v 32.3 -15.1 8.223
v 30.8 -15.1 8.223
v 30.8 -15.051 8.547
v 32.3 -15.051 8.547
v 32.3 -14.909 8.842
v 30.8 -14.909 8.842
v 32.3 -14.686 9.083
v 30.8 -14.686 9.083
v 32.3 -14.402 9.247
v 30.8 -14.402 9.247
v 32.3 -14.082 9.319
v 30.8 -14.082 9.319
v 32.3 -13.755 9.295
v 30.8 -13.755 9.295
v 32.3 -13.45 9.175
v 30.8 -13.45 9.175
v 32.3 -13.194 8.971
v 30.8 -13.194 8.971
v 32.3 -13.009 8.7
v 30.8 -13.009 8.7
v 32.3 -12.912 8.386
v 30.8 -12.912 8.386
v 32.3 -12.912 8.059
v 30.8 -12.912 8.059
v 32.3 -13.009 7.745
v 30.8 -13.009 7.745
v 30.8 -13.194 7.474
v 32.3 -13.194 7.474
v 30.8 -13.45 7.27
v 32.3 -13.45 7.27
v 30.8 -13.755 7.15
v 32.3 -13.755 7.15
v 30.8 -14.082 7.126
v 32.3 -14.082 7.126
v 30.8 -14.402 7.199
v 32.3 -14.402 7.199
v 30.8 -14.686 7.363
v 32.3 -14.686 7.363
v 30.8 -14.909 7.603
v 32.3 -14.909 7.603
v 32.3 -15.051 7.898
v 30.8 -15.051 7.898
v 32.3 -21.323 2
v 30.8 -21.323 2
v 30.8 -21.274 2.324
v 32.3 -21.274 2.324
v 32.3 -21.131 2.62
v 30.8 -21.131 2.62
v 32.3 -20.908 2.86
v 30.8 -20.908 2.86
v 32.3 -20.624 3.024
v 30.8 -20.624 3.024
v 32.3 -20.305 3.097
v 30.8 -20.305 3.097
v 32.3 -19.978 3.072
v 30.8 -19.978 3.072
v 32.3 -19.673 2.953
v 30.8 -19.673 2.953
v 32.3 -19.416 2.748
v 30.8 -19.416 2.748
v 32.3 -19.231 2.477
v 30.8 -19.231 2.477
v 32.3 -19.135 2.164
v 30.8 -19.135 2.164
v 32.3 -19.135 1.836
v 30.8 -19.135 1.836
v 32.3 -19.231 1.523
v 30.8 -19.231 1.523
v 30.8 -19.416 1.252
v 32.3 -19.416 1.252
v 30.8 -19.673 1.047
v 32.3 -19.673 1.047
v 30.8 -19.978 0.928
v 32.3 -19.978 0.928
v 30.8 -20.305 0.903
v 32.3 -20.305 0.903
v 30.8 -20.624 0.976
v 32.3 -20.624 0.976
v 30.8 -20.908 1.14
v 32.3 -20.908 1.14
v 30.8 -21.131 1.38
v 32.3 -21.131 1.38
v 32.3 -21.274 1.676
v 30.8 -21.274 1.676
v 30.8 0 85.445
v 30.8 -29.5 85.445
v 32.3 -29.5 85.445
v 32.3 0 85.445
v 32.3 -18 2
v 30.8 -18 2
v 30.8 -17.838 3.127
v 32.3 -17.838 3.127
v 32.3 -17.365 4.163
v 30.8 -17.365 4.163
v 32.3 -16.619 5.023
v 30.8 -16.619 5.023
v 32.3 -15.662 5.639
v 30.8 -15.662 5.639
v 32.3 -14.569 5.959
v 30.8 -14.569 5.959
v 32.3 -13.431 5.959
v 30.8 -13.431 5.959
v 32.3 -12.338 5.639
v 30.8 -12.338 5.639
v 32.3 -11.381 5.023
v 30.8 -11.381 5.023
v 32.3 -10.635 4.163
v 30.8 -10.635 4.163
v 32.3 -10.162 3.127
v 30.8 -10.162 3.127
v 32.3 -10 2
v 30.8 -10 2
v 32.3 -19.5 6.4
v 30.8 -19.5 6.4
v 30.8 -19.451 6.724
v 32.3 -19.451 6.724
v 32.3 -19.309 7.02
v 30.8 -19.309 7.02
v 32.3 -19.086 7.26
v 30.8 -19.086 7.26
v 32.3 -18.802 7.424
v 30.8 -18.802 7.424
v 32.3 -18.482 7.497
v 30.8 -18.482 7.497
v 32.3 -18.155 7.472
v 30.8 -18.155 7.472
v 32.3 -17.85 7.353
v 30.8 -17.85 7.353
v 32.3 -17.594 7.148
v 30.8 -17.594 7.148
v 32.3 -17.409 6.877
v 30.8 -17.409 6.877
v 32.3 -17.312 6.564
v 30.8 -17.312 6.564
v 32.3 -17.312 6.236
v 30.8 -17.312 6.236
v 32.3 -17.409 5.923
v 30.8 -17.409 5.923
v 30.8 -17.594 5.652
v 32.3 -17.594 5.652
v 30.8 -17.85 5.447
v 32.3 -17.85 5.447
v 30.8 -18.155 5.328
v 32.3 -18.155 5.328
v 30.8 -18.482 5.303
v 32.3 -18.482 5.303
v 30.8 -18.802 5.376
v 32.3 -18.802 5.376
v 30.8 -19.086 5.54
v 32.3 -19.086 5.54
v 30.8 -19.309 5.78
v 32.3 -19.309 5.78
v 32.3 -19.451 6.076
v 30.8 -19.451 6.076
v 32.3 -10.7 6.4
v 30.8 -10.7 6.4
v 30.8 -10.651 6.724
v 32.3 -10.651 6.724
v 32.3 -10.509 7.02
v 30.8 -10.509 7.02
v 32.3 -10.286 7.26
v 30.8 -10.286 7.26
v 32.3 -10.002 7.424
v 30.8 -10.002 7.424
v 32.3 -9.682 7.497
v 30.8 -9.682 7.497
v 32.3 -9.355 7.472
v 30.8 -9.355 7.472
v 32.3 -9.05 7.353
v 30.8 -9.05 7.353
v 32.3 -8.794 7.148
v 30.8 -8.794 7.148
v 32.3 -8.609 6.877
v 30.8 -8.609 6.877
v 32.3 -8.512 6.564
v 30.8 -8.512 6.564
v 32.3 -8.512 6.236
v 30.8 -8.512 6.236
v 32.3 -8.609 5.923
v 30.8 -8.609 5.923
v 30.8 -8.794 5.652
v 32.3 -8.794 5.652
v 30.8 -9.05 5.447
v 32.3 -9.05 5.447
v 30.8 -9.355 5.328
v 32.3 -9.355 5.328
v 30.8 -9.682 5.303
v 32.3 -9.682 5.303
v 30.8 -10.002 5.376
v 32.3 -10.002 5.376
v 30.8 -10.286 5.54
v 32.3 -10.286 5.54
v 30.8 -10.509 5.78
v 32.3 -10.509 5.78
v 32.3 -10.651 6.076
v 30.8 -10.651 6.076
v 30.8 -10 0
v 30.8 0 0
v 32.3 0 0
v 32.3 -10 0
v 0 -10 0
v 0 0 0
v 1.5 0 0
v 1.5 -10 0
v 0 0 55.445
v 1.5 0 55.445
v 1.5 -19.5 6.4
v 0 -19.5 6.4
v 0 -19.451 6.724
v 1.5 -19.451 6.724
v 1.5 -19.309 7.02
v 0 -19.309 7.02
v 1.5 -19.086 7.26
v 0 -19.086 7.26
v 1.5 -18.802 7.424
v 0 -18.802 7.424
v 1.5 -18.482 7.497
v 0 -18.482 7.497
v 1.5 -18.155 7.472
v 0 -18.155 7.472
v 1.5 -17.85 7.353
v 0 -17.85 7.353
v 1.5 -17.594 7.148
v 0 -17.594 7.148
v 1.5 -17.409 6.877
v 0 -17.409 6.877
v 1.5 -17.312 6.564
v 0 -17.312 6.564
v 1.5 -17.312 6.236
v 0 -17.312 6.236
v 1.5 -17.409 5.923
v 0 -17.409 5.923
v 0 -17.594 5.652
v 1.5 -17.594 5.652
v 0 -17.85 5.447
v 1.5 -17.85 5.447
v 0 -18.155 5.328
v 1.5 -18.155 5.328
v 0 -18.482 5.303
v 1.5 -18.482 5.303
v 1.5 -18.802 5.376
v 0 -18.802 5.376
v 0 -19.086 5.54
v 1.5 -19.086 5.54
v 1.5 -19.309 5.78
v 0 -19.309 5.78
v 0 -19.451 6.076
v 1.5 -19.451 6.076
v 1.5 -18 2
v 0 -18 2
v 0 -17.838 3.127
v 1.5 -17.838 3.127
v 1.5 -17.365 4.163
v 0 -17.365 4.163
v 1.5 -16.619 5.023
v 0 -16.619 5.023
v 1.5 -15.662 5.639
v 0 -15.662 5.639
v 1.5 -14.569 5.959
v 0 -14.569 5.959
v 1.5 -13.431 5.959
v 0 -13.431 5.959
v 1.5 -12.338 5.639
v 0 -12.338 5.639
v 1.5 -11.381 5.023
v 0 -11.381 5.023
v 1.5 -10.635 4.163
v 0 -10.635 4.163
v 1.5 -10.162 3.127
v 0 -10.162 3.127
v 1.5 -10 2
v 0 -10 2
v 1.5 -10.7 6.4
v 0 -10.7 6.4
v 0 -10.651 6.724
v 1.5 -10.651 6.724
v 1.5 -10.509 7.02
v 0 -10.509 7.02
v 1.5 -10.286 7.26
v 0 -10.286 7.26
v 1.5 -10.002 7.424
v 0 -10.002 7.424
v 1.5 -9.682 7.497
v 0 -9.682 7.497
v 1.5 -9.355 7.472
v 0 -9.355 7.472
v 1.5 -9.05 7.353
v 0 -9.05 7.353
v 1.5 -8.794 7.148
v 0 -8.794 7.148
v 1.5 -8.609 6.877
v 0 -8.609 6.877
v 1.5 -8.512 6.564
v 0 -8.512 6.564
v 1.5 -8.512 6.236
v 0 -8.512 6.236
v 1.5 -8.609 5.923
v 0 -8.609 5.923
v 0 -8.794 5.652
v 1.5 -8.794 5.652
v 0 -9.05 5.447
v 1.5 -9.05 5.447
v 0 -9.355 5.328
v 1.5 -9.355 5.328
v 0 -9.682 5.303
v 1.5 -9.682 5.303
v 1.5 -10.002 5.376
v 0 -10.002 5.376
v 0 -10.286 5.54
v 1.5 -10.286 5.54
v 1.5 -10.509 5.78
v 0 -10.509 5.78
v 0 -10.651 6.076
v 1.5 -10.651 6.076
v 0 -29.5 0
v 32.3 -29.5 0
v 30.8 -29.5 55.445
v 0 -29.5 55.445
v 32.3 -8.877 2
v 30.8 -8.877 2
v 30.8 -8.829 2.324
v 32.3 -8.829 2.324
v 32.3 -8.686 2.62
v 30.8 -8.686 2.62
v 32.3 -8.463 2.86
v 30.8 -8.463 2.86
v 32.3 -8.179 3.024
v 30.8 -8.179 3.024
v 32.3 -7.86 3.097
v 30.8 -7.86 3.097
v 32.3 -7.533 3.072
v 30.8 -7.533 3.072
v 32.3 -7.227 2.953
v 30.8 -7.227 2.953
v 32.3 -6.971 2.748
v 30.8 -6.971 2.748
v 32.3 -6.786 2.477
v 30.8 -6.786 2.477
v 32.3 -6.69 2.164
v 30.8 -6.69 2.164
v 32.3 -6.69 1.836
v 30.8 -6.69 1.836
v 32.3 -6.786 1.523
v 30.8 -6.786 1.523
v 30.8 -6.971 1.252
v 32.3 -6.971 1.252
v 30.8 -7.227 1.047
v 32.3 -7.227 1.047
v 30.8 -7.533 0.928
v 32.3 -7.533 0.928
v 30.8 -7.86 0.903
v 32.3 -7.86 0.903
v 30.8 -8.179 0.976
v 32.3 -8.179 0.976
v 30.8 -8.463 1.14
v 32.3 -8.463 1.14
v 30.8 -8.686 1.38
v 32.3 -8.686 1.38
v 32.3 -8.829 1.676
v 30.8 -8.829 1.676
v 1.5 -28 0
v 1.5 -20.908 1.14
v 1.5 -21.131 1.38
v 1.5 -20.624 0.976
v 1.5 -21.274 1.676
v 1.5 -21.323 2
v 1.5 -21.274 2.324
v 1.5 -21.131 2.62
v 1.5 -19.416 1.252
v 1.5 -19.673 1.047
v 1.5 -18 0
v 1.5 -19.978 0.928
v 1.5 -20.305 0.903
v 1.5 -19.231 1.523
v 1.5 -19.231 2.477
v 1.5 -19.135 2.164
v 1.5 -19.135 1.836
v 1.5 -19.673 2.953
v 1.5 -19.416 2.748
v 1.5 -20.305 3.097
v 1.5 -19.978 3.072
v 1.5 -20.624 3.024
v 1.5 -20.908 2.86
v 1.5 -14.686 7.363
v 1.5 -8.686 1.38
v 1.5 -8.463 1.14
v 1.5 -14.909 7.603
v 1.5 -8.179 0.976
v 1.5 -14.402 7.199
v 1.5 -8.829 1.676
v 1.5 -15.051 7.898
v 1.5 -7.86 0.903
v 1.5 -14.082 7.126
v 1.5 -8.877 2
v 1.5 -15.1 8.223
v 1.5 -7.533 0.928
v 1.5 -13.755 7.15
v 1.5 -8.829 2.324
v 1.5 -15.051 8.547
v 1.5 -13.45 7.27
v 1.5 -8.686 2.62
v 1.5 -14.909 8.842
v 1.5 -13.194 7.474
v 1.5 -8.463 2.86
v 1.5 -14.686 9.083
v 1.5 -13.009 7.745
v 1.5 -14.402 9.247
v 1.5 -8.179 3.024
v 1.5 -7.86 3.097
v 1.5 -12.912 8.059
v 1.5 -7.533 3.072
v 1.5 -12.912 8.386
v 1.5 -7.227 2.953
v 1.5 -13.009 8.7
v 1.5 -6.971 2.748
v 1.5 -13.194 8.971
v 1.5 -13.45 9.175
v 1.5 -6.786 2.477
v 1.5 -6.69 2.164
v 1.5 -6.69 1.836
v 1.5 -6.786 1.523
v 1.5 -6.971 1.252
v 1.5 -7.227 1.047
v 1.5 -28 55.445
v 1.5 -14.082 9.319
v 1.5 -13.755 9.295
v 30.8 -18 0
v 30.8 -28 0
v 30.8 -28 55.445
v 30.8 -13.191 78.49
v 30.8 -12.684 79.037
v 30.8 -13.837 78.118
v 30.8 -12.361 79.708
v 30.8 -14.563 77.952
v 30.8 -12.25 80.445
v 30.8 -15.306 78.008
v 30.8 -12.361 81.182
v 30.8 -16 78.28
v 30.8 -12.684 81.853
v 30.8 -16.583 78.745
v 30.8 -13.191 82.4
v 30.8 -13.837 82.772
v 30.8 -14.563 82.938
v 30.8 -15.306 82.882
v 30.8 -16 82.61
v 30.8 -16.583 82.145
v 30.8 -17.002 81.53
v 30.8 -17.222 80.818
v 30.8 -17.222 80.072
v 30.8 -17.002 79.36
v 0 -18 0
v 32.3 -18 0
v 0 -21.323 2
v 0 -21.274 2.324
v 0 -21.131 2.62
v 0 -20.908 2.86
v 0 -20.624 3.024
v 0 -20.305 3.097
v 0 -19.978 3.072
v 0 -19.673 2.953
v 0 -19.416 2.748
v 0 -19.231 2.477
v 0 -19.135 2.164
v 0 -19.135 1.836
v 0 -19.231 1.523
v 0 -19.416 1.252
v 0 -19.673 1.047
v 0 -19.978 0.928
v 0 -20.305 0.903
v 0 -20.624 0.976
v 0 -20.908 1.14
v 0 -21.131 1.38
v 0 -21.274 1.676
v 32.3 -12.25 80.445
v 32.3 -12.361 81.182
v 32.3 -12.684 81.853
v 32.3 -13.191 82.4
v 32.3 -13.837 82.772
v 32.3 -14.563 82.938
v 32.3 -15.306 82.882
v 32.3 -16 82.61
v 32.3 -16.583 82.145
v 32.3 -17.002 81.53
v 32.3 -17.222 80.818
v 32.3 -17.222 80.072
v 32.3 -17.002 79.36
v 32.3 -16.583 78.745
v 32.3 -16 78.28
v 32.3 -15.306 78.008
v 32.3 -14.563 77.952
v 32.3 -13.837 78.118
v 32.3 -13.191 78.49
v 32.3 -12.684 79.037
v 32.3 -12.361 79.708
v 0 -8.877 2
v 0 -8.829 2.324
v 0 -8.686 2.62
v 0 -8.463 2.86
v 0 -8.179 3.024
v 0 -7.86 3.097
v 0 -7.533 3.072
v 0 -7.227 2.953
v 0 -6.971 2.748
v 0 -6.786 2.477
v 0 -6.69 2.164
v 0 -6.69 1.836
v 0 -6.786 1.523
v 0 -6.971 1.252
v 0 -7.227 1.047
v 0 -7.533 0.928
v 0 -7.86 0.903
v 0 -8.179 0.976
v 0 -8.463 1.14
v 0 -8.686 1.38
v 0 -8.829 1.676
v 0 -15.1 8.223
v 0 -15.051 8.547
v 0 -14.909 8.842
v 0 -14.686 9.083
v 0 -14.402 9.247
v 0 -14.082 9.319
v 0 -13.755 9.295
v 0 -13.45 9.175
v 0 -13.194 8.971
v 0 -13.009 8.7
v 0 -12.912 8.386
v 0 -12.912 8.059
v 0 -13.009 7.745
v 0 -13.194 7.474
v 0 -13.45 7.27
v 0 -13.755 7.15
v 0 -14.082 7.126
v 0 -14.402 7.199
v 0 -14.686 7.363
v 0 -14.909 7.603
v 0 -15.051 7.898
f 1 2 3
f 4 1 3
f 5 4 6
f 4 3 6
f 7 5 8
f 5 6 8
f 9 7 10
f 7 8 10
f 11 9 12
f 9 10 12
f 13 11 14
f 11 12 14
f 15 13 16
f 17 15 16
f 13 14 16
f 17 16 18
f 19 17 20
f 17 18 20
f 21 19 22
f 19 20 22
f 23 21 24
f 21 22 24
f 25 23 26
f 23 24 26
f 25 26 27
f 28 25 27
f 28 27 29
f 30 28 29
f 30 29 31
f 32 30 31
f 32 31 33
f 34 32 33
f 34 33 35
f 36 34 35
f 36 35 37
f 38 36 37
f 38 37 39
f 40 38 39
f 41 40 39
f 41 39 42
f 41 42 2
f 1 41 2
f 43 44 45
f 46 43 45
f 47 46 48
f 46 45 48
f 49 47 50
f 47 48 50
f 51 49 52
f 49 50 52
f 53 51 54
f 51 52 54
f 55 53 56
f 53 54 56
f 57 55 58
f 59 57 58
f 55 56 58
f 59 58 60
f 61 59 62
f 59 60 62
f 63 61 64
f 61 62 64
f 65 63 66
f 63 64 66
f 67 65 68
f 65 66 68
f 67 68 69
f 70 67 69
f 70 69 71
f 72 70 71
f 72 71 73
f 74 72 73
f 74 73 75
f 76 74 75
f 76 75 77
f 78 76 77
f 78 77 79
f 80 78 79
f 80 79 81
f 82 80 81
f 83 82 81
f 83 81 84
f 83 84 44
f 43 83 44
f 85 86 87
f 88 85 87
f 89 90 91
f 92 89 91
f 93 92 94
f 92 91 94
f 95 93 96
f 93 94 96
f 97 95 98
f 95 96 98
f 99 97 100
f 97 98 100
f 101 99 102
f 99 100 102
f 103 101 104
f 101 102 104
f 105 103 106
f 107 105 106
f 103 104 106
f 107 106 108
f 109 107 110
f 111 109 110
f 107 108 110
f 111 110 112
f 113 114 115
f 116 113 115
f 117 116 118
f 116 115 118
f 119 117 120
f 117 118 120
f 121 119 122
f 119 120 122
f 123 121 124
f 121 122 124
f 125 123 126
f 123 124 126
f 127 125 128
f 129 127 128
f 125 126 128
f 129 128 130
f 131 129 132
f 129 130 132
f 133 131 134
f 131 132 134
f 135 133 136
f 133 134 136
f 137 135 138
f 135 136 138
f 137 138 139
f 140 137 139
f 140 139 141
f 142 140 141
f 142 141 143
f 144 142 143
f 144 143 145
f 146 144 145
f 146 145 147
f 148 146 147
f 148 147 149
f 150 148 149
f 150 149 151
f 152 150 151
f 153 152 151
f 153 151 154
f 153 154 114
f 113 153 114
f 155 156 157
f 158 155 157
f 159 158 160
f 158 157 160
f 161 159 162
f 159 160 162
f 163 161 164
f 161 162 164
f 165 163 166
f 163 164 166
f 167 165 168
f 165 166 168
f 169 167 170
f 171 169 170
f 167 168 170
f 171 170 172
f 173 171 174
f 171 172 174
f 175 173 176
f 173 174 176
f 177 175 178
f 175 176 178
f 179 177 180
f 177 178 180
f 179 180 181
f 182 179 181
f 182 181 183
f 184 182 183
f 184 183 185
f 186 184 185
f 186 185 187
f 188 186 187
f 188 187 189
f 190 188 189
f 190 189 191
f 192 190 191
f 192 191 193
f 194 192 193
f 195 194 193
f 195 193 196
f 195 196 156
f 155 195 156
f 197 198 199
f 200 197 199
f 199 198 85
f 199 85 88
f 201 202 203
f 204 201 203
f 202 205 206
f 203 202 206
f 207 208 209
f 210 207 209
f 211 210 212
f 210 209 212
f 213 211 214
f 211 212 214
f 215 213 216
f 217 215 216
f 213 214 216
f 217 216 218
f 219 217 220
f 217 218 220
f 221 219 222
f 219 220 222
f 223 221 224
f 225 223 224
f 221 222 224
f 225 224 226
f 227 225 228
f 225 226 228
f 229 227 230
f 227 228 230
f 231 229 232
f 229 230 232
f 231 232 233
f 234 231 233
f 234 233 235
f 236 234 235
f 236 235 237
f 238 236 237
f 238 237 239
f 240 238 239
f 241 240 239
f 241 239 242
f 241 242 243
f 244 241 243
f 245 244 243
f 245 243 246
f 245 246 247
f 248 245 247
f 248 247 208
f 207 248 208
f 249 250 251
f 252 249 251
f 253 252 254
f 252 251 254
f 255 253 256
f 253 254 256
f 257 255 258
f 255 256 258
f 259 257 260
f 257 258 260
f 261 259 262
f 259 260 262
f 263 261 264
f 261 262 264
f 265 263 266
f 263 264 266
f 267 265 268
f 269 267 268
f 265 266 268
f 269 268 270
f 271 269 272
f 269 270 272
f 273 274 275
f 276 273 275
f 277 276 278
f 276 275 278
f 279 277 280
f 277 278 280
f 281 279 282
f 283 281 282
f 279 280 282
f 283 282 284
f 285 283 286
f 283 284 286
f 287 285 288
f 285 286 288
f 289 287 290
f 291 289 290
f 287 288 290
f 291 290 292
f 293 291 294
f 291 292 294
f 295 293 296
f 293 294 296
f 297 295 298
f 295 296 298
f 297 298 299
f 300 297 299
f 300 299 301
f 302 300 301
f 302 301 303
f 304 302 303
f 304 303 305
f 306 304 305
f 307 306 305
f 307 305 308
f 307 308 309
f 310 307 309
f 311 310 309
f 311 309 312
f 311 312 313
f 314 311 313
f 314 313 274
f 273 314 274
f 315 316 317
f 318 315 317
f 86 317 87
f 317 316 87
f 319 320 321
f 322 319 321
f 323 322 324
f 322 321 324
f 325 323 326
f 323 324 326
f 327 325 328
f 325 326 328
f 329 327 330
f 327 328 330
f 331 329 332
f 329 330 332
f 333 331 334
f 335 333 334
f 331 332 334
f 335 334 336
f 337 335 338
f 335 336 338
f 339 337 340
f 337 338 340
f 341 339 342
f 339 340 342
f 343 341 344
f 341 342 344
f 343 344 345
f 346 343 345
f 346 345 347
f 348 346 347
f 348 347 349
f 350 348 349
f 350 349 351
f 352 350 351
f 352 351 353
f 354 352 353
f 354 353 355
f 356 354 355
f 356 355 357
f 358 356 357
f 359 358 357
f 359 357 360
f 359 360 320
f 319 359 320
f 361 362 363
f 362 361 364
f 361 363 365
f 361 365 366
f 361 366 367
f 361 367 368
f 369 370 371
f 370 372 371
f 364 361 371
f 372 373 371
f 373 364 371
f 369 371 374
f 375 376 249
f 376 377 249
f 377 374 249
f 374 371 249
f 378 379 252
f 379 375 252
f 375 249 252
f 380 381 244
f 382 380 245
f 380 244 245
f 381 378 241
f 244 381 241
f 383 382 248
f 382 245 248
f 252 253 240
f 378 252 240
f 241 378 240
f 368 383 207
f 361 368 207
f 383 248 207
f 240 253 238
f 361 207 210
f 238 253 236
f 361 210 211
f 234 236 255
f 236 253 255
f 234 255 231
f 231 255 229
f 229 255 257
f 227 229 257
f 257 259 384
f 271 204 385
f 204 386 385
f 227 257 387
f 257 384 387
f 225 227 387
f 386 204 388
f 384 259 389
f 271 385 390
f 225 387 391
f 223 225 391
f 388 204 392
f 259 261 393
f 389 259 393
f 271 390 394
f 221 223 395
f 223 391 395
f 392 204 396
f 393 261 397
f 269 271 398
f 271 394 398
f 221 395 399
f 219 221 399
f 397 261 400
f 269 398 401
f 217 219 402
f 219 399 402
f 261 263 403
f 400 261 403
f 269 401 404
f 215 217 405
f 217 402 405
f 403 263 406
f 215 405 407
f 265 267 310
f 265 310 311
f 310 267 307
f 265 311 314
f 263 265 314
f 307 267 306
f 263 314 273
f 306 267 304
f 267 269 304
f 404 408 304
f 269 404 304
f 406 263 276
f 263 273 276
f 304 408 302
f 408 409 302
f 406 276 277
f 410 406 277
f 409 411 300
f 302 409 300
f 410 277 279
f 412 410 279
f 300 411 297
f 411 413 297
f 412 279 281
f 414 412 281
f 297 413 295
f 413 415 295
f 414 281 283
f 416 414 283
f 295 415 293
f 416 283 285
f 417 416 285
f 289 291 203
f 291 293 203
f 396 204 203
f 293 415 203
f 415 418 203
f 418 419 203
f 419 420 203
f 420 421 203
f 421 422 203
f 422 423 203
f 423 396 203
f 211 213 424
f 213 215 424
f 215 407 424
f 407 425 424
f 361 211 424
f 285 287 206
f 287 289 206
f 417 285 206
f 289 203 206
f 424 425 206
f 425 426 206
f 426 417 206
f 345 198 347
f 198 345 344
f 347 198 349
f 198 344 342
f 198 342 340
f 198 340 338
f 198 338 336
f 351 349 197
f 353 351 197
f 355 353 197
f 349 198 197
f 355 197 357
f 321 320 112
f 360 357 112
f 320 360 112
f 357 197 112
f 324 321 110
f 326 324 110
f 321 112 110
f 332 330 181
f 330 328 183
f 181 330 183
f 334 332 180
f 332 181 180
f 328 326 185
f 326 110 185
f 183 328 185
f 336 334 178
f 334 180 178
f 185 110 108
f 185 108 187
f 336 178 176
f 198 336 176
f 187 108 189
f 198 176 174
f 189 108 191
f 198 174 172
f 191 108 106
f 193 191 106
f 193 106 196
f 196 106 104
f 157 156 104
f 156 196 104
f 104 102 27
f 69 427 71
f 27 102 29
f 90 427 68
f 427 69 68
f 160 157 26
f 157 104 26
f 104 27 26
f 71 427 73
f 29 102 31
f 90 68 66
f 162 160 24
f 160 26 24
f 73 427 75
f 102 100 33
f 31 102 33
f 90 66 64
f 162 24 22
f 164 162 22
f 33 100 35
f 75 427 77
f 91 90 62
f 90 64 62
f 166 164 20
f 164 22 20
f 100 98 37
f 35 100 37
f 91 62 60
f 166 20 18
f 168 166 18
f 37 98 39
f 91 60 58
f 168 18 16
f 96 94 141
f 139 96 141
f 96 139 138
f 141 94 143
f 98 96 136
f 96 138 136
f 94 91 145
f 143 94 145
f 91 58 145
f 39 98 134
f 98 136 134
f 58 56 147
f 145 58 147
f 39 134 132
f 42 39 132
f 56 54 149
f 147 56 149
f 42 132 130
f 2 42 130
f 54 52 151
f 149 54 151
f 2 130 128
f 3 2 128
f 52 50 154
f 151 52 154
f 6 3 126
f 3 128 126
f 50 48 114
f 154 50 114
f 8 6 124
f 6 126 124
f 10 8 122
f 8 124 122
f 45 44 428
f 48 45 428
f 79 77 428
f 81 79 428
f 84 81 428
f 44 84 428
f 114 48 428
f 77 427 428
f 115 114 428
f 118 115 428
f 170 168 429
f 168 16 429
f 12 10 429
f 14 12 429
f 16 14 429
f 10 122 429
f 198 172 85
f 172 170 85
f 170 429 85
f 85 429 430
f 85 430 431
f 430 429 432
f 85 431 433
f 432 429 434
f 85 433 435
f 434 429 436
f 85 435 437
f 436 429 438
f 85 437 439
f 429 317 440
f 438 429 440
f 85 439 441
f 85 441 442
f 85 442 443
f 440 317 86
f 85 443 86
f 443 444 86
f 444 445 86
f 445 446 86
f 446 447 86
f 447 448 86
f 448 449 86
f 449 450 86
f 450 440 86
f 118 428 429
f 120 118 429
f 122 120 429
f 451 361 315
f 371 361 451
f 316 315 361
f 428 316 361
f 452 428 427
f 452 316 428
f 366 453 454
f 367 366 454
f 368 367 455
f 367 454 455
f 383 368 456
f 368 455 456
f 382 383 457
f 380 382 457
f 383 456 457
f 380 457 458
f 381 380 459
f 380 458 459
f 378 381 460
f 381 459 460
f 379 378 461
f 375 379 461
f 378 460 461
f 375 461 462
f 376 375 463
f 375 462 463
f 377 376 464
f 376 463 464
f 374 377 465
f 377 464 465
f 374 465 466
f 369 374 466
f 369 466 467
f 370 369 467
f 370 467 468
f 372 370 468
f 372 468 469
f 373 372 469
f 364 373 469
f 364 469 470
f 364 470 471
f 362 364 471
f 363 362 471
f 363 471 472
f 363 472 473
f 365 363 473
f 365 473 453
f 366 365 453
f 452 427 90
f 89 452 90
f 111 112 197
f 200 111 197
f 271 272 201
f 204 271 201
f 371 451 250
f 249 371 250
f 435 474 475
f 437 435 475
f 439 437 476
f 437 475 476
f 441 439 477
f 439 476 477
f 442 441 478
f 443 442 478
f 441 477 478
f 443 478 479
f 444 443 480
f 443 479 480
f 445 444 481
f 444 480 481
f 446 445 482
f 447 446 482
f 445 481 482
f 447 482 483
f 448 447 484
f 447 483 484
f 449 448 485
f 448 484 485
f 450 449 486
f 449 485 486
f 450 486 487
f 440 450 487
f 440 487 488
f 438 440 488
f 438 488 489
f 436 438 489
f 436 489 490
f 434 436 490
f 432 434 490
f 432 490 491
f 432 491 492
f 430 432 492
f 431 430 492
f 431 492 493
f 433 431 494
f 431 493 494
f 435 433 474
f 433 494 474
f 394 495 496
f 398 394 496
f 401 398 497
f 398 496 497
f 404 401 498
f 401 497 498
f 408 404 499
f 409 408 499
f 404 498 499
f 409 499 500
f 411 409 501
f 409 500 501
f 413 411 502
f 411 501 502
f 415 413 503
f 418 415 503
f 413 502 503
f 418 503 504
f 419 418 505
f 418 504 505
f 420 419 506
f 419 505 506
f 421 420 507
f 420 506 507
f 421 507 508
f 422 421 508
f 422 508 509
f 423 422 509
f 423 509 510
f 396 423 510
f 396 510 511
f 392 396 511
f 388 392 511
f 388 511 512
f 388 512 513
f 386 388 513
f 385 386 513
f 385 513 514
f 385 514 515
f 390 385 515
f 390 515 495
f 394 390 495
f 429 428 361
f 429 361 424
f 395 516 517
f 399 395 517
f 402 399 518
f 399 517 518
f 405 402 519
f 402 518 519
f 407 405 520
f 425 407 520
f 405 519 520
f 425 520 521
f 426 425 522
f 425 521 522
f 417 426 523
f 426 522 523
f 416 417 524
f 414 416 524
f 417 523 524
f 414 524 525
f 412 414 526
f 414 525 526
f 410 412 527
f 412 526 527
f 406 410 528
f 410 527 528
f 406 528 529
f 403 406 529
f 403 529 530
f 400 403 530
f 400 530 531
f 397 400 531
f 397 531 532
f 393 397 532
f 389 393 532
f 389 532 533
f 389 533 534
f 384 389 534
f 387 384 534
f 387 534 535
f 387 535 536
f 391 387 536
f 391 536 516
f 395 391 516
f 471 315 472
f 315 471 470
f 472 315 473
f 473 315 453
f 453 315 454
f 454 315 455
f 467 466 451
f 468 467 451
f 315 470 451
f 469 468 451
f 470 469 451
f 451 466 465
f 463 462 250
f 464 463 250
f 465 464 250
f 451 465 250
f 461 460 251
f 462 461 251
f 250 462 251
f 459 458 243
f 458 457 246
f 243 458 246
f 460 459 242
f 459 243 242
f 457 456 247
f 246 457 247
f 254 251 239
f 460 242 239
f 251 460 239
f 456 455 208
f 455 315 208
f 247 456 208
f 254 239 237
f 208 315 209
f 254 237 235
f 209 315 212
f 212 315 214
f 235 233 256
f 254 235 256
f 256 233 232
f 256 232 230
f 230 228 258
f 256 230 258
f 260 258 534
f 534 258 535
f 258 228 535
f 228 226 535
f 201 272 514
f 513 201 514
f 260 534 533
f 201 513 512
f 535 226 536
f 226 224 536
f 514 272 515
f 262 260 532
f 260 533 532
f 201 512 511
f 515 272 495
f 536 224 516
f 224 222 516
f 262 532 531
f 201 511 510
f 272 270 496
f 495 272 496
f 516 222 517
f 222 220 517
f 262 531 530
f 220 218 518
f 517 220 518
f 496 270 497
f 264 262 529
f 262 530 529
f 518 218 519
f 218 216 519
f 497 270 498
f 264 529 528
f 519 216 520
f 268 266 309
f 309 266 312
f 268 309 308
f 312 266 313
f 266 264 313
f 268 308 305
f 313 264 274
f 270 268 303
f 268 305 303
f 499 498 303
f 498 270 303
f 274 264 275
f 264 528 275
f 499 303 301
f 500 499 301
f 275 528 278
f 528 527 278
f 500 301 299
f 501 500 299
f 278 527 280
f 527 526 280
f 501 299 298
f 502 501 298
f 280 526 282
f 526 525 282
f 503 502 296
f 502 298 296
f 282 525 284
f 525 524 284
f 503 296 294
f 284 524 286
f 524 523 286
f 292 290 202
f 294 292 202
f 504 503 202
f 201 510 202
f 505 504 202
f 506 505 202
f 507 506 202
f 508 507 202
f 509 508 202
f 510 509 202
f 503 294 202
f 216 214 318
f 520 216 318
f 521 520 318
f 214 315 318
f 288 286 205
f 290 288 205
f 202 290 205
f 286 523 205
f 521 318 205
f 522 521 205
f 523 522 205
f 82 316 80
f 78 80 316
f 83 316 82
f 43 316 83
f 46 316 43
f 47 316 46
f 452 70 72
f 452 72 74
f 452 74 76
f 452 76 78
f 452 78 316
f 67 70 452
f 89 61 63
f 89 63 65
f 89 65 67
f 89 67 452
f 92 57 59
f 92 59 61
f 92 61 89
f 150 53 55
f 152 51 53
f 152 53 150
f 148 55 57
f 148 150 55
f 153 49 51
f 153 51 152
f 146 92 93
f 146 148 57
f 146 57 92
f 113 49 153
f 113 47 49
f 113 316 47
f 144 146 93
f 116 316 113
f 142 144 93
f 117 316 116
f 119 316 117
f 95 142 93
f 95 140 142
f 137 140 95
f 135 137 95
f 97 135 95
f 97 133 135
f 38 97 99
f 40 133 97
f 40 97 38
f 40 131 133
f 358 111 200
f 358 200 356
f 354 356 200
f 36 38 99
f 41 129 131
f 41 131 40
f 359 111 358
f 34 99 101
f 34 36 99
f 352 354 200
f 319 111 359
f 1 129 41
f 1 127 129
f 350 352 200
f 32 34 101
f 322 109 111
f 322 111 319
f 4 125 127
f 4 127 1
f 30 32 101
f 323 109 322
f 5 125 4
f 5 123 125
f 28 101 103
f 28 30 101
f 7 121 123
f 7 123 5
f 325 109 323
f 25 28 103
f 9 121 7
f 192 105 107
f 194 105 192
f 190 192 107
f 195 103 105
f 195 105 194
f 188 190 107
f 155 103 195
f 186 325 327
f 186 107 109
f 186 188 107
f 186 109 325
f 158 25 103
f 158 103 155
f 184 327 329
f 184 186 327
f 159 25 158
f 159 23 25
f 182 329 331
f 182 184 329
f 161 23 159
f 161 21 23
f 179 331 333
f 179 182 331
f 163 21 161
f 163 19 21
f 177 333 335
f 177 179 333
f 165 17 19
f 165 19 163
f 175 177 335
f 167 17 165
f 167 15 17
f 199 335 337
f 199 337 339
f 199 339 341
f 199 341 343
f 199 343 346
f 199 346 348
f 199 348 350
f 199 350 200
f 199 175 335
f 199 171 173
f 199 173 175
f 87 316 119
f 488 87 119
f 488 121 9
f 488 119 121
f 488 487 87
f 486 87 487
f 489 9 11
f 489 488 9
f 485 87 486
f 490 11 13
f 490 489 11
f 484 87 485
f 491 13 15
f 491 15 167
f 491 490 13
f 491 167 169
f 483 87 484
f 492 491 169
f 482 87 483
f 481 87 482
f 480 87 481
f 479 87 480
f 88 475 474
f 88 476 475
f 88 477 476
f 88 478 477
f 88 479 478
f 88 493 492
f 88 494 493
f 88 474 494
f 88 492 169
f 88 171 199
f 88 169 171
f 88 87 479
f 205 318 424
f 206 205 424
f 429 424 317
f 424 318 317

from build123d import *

# Parameters (mm, degrees)
F1_DEPTH  = 28
F2_R      = 1.1
F3_DEPTH  = 32.301
F4_R      = 1.1
F5_DEPTH  = 1.5
F6_W      = 1.5
F6_H      = 86.945
F7_DEPTH  = 32.3
F8_W      = 29.3
F8_H      = 30
F8_W_2    = 1.5
F9_DEPTH  = 29.501
F10_R     = 2.5
F11_DEPTH = 1.5


with BuildPart() as f1:
    # F0 (on Front) → F1 (new body)
    with BuildSketch(Plane.XZ):
        Polygon((0, 86.945), (0, 0), (1.5, 0), (1.5, 85.445), (30.8, 85.445), (30.8, 0), (32.3, 0), (32.3, 86.945), align=None)
    extrude(amount=F1_DEPTH)

    # F2 (on face) → F3 (cut, through all)
    with BuildSketch(Plane(origin=(0, 0, 0), x_dir=(0, -1, 0), z_dir=(-1, 0, 0))):
        with BuildLine():
            Line((18, 0), (18, 2))
            ThreePointArc((18, 2), (14, 6), (10, 2))
            Line((10, 2), (10, 0))
            Line((10, 0), (18, 0))
        make_face()
        with Locations((20.22254, 2)):
            Circle(F2_R)
        with Locations((18.4, 6.4)):
            Circle(F2_R)
        with Locations((14, 8.22254)):
            Circle(F2_R)
        with Locations((9.6, 6.4)):
            Circle(F2_R)
        with Locations((7.77746, 2)):
            Circle(F2_R)
    extrude(amount=-F3_DEPTH, mode=Mode.SUBTRACT)

    # F4 (on face) → F5 (cut, through all)
    with BuildSketch(Plane.XY.offset(86.945)):
        with Locations((6.15, -4)):
            Circle(F4_R)
        with Locations((26.15, -4)):
            Circle(F4_R)
        with Locations((6.15, -24)):
            Circle(F4_R)
        with Locations((26.15, -24)):
            Circle(F4_R)
    extrude(amount=-F5_DEPTH, mode=Mode.SUBTRACT)

    # F6 (on face) → F7 (join)
    with BuildSketch(Plane.YZ.offset(32.3)):
        with Locations((-28.75, 43.4725)):
            Rectangle(F6_W, F6_H)
    extrude(amount=-F7_DEPTH)

    # F8 (on face) → F9 (cut, through all)
    with BuildSketch(Plane.XZ.offset(29.5)):
        with Locations((16.15, 70.445)):
            Rectangle(F8_W, F8_H)
        with Locations((0.75, 70.445)):
            Rectangle(F8_W_2, F8_H)
        Polygon((32.3, 86.945), (0, 86.945), (0, 85.445), (1.5, 85.445), (30.8, 85.445), (32.3, 85.445), align=None)
    extrude(amount=-F9_DEPTH, mode=Mode.SUBTRACT)

    # F10 (on face) → F11 (cut, through all)
    with BuildSketch(Plane.YZ.offset(32.3)):
        with Locations((-14.75, 80.445)):
            Circle(F10_R)
    extrude(amount=-F11_DEPTH, mode=Mode.SUBTRACT)


solid = f1.part
